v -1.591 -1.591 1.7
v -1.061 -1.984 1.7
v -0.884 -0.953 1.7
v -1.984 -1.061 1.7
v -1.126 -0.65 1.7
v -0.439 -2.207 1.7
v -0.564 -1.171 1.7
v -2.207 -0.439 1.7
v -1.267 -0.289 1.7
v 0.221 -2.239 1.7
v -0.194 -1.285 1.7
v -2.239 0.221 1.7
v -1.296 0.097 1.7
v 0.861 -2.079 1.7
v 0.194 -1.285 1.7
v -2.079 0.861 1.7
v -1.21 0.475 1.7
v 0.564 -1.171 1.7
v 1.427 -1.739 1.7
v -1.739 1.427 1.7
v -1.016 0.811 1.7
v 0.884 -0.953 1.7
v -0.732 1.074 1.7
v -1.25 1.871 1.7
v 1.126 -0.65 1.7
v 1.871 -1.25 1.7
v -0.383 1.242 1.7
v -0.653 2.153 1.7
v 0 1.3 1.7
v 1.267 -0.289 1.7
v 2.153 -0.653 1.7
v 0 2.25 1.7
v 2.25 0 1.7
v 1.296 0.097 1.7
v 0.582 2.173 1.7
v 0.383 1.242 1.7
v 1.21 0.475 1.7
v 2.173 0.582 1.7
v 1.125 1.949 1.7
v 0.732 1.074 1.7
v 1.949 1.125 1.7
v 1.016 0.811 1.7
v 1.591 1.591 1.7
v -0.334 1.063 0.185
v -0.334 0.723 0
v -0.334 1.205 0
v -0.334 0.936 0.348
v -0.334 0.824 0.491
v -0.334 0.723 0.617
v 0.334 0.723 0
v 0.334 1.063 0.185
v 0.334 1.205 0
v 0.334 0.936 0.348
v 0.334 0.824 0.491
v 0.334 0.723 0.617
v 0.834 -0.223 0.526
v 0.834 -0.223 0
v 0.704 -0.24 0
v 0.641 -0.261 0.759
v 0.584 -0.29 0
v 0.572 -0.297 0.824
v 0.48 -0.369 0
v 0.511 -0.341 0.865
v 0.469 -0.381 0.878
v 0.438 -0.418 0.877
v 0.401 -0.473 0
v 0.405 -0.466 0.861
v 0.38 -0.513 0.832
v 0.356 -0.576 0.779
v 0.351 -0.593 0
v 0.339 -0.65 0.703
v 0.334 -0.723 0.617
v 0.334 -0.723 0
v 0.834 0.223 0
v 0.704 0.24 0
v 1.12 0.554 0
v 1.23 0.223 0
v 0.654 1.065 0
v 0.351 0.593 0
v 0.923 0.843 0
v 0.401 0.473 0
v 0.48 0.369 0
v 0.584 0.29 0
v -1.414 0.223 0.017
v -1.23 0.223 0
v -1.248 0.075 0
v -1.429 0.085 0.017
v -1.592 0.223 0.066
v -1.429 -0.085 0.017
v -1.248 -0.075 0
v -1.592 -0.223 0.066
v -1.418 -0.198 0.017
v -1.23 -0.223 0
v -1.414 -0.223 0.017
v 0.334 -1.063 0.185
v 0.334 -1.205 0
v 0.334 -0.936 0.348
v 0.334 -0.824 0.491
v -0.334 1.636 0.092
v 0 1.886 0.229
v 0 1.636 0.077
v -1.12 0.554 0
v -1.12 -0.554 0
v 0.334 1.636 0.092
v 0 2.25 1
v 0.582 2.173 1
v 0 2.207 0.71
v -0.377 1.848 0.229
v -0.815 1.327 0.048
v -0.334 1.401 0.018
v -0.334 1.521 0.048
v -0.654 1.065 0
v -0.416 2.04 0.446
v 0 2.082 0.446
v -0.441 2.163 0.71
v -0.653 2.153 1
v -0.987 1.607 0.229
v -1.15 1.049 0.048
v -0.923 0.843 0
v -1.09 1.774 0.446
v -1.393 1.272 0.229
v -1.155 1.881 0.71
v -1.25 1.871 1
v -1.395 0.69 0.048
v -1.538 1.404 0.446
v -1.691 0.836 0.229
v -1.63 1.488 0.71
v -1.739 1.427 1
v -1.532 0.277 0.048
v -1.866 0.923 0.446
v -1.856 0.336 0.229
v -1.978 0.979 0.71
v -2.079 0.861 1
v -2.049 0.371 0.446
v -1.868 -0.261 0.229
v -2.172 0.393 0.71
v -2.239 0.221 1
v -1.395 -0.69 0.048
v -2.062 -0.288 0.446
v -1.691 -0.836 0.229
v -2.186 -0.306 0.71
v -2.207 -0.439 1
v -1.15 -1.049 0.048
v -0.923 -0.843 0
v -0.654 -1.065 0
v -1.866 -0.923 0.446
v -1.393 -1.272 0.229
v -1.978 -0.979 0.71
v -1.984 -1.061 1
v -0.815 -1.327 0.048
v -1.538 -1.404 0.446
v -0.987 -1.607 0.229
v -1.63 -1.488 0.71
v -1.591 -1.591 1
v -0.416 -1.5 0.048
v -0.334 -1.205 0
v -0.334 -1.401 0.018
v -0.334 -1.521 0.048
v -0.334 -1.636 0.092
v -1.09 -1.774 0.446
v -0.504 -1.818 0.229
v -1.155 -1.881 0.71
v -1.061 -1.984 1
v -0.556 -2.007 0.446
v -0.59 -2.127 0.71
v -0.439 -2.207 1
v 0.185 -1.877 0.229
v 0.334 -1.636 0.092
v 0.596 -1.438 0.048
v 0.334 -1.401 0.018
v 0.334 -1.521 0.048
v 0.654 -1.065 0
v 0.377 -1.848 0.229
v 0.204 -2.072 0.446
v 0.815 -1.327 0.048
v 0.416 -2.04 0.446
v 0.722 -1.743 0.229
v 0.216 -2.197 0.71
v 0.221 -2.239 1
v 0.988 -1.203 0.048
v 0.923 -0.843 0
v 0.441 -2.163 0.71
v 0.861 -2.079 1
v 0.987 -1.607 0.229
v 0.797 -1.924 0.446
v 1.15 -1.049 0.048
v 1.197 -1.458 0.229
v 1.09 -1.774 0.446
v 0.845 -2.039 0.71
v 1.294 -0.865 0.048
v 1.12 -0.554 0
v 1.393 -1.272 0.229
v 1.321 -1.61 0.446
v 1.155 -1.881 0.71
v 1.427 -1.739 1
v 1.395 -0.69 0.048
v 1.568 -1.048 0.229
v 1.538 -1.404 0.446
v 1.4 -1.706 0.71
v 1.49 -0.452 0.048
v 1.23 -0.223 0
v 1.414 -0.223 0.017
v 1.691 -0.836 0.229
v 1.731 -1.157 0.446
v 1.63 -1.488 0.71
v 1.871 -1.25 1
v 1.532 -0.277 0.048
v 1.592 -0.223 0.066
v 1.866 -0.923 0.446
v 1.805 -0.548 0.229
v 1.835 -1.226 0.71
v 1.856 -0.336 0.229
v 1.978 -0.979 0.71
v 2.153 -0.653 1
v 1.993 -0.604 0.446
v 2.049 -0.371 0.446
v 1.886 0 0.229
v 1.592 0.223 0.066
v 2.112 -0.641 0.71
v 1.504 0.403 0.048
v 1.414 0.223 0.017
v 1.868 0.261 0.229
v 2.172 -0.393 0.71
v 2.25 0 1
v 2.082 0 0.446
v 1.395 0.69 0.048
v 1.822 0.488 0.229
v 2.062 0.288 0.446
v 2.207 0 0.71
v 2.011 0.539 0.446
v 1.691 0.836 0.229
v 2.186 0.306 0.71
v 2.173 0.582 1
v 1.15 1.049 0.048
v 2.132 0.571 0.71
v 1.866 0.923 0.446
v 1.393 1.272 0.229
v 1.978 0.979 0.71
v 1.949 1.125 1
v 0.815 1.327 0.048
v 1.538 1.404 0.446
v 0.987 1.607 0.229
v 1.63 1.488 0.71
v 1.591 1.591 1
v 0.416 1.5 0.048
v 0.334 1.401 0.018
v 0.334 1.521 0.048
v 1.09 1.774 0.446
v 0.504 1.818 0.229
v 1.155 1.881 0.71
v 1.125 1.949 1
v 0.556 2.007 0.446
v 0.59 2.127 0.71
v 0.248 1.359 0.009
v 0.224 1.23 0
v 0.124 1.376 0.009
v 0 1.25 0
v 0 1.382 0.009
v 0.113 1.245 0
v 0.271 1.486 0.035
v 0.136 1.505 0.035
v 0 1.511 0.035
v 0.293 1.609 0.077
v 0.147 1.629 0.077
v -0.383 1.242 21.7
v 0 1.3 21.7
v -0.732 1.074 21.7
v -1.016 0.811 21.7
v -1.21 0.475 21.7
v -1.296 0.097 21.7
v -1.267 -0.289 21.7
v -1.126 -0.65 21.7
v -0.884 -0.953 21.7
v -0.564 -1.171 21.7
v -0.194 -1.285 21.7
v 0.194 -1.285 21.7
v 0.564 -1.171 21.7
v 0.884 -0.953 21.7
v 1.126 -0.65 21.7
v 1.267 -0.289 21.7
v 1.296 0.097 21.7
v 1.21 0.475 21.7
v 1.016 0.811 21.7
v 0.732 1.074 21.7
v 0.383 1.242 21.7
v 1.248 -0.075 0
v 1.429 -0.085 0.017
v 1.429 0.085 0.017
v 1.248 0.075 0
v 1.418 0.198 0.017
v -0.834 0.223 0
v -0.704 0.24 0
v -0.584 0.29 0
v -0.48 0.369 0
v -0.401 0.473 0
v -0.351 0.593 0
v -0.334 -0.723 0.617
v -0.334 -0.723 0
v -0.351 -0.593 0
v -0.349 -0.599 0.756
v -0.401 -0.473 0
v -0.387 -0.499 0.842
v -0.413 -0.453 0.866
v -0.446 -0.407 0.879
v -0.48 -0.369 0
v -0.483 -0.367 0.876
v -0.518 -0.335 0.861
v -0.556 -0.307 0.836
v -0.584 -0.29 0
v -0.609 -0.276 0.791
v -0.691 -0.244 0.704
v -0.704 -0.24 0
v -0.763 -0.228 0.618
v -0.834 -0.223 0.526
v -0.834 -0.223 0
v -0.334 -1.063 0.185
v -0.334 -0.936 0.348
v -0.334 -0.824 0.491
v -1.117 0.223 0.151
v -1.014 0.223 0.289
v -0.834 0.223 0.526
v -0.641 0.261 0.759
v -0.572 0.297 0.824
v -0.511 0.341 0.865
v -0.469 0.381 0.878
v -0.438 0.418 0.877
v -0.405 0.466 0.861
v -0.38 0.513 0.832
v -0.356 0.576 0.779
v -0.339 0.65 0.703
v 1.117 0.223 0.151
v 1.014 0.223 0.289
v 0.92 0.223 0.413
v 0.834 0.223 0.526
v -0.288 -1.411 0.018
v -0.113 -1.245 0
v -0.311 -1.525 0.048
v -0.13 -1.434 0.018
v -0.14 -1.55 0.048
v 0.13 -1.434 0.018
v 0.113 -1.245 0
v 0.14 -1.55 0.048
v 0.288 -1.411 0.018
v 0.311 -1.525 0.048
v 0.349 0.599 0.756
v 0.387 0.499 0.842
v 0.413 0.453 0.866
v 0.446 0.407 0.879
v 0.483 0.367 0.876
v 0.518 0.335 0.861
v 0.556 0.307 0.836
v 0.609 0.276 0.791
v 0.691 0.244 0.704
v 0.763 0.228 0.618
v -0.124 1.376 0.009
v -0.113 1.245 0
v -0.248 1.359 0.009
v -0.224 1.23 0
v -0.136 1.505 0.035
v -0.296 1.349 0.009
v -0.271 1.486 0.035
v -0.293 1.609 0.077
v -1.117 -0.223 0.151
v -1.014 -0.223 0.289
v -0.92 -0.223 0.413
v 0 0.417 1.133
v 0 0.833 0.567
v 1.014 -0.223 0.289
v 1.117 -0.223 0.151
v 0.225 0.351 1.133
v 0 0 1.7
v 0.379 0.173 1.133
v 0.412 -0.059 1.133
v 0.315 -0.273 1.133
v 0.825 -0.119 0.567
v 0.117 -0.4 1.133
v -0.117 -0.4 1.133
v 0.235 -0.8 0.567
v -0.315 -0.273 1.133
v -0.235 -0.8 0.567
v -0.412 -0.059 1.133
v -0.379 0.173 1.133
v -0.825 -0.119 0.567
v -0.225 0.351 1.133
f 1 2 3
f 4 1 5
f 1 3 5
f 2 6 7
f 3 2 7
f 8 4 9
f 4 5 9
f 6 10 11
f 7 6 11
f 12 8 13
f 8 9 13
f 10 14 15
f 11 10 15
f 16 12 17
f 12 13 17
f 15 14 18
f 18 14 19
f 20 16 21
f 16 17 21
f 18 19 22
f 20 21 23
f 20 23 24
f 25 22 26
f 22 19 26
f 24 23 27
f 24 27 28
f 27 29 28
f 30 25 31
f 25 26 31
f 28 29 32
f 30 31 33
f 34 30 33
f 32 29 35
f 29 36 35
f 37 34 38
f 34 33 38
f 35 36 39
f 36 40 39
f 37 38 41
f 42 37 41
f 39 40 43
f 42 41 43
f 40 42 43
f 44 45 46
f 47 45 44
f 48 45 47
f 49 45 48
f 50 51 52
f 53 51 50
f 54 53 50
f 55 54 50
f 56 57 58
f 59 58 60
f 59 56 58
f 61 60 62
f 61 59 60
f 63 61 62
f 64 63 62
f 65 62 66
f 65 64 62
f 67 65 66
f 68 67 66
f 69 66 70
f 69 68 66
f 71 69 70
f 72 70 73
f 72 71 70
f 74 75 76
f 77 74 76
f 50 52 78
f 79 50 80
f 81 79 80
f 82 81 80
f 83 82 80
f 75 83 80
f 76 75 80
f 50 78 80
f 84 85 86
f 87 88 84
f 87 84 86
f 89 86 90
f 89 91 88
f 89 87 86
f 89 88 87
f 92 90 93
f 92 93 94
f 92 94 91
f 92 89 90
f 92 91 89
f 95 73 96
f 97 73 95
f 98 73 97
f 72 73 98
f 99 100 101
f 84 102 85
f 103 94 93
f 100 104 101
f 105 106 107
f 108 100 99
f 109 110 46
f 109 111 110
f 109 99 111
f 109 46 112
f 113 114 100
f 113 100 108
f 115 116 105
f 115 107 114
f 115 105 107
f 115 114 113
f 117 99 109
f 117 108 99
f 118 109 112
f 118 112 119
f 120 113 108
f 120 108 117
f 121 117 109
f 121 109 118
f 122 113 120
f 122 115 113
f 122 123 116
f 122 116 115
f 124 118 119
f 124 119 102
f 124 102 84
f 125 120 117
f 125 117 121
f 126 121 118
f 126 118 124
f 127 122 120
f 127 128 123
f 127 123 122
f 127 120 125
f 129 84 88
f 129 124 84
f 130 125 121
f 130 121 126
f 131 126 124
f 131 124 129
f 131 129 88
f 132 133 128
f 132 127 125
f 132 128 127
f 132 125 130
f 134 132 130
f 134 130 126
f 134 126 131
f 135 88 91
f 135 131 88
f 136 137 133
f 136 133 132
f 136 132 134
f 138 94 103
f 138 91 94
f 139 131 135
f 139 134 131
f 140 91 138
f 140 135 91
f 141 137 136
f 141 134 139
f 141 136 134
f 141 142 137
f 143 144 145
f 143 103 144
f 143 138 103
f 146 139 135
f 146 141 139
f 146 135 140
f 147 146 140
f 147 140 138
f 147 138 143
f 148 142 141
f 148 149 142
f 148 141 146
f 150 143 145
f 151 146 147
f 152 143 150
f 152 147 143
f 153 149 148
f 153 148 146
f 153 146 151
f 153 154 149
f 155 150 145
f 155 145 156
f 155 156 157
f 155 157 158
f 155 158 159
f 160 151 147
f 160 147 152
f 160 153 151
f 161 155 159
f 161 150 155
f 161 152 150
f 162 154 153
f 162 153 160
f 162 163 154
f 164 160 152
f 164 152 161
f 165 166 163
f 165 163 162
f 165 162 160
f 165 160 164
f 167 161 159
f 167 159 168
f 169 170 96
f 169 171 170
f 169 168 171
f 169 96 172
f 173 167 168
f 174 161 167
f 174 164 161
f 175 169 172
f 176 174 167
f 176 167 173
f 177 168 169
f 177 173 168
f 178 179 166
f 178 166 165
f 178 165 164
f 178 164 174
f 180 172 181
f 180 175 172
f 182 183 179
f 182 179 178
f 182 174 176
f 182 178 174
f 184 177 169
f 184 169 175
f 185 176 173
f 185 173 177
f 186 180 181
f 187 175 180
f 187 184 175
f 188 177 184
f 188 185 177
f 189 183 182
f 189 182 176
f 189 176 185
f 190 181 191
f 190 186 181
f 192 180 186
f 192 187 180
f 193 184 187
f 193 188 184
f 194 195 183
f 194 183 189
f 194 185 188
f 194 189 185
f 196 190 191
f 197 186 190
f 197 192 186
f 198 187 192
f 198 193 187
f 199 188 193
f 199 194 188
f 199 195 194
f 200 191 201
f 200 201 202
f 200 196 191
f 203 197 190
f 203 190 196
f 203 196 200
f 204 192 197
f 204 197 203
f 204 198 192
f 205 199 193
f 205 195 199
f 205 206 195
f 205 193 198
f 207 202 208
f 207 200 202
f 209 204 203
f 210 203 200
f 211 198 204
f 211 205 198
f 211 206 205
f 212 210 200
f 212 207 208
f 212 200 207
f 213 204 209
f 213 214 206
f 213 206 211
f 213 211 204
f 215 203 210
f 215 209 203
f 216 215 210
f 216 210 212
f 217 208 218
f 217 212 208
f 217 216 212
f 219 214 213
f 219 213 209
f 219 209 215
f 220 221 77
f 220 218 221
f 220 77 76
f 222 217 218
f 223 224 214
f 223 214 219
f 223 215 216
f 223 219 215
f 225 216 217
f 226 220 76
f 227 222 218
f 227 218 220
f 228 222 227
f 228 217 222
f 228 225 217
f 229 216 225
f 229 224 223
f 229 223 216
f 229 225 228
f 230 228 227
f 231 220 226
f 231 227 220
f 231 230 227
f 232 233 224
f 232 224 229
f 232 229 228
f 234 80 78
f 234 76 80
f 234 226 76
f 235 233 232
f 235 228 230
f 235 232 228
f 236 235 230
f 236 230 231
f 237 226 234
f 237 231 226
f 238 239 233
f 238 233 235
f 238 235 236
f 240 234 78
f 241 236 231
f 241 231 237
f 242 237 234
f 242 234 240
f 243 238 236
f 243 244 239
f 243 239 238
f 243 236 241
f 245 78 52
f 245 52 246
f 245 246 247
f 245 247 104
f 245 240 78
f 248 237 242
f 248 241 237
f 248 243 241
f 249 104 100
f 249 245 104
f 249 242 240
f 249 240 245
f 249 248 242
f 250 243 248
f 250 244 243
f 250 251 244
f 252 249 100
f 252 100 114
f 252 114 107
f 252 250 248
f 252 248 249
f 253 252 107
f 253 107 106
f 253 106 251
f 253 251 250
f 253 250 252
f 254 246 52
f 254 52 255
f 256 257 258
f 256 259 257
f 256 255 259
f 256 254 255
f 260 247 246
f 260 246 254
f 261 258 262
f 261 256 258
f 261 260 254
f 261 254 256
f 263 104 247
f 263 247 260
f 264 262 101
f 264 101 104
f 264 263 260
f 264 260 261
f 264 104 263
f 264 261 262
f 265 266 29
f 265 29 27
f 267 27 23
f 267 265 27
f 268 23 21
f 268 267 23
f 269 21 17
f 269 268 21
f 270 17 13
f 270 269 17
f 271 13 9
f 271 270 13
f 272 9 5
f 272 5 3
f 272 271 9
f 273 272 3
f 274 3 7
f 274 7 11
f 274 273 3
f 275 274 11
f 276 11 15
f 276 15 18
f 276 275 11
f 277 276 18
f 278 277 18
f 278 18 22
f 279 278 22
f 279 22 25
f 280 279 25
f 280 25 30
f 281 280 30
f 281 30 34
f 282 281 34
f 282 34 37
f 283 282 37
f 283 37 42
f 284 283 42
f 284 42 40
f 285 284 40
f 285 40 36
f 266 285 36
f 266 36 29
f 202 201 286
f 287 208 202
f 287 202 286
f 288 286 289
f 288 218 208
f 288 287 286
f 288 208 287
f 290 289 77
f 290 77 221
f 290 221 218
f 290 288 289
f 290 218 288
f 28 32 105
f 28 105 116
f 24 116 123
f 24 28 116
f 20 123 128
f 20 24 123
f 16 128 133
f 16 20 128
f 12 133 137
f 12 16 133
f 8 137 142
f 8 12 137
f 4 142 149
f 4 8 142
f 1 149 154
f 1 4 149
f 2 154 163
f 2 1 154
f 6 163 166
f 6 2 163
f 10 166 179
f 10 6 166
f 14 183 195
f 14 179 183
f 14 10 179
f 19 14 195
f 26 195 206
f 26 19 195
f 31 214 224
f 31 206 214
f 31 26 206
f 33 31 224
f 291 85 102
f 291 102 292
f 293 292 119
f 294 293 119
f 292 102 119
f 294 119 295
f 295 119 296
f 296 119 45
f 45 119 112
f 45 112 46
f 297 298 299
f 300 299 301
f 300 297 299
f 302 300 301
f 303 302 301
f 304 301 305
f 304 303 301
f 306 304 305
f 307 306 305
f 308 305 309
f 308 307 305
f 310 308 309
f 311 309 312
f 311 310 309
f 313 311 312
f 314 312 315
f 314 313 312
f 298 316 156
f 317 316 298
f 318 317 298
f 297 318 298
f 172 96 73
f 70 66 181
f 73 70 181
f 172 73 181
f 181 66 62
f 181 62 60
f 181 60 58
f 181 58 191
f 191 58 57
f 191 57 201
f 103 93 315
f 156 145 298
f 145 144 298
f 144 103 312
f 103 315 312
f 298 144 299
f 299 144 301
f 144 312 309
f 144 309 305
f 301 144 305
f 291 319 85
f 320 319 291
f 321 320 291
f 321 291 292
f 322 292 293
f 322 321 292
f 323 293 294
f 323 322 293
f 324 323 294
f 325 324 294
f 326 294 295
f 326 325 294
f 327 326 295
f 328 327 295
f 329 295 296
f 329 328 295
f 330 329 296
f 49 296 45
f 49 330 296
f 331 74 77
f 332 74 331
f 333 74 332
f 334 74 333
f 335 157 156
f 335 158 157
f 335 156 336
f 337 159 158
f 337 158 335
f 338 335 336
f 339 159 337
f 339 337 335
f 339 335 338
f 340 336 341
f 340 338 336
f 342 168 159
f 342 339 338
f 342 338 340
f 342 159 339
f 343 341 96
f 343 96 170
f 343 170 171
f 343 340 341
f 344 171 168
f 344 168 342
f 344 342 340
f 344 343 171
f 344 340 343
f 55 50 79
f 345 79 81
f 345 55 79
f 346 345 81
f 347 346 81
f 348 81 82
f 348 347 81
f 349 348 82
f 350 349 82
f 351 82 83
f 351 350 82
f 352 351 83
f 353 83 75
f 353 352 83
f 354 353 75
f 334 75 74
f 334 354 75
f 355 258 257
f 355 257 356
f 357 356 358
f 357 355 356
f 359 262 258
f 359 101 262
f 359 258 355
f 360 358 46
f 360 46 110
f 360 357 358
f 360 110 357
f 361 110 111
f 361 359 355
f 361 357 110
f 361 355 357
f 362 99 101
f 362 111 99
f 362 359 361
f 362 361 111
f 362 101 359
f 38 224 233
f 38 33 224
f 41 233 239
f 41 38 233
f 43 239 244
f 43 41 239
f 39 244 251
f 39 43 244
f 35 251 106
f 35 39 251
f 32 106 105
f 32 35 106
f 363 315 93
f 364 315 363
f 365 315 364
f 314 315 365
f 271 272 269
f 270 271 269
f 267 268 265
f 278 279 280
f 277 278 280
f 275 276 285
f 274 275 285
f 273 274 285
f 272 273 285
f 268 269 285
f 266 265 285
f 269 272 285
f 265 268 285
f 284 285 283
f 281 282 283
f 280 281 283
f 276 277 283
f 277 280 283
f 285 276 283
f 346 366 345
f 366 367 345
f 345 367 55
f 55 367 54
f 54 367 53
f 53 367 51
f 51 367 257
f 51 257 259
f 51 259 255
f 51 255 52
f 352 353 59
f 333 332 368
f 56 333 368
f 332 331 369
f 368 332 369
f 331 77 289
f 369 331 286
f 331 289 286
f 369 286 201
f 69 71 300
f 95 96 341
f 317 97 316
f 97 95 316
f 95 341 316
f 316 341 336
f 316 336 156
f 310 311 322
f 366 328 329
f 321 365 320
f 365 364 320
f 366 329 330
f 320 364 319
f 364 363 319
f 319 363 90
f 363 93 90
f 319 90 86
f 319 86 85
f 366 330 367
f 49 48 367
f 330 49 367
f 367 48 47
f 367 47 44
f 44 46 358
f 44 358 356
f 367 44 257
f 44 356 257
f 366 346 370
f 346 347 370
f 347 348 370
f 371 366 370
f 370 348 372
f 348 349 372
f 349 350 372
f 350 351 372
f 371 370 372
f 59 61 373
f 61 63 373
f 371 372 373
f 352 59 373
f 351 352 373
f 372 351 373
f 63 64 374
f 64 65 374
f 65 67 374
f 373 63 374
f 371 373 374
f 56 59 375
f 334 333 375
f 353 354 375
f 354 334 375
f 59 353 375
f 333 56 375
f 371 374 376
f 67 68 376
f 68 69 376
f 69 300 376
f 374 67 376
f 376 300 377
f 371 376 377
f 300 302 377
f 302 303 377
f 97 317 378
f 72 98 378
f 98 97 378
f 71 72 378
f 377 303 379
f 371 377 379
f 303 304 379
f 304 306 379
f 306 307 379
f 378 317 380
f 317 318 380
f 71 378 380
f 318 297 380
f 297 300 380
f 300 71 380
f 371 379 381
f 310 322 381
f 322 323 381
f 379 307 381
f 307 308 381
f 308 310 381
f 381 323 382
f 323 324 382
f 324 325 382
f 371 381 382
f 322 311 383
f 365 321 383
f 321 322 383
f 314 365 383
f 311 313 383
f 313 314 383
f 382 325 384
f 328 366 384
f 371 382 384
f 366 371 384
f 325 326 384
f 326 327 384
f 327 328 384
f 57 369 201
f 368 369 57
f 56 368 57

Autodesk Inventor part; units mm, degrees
ref_plane "YZ Plane" through (0, 0, 0) normal (1, 0, 0) x (0, 1, 0)
ref_plane "XZ Plane" through (0, 0, 0) normal (0, 1, 0) x (-1, 0, 0)
ref_plane "XY Plane" through (0, 0, 0) normal (0, 0, 1) x (1, 0, 0)
sketch "スケッチ1" plane through (0, 0, 0) normal (1, 0, 0) x (0, 1, 0)
  line L0 (0, 21.7) -> (0, 0)
  line L1 (0, 0) -> (1.25, 0)
  line L2 (2.25, 1) -> (2.25, 1.7)
  line L3 (2.25, 1.7) -> (1.3, 1.7)
  line L4 (1.3, 1.7) -> (1.3, 21.7)
  line L5 (1.3, 21.7) -> (0, 21.7)
  line L6 (1.25, 0) -> (0, 1.7)
  arc A0 (1.25, 0) -> (2.25, 1) centre (1.25, 1) ccw
  line L7 (1.25, 0) -> (2.25, 0)
  line L8 (2.25, 0) -> (2.25, 1)
  dimension "d2" = 1.7
  dimension "d10" = 20
  dimension "d11" = 2.6
  dimension "d12" = 4.5
  dimension "d14" = 1
revolve "回転1" add sketch "スケッチ1" angle 360 about axis through (0, 0, 21.7) along (0, 0, -1) contours L5 L4 L3 L2 A0 L6 L0
thread "ねじ1" size "M2.6x0.45" class "6g" standard "ANSI Metric M Profile" full length
sketch "スケッチ2" plane through (0, 0, 1.7) normal (0, 0, 1) x (1, 0, 0)
  line L0 (0.3339, -1.6357) -> (-0.3339, -1.6357)
  line L1 (-0.3339, -1.6357) -> (-0.3339, -0.7226)
  line L2 (-0.3339, 1.6357) -> (0.3339, 1.6357)
  line L3 (0.3339, 1.6357) -> (0.3339, 0.7226)
  line L4 (0.3339, -1.6357) -> (-0.3339, 1.6357) construction
  line L5 (-0.3339, -1.6357) -> (0.3339, 1.6357) construction
  line L6 (-1.5922, 0.2226) -> (-0.8339, 0.2226)
  line L7 (1.5922, 0.2226) -> (1.5922, -0.2226)
  line L8 (1.5922, -0.2226) -> (0.8339, -0.2226)
  line L9 (-1.5922, -0.2226) -> (-1.5922, 0.2226)
  line L10 (-1.5922, 0.2226) -> (1.5922, -0.2226) construction
  line L11 (1.5922, 0.2226) -> (-1.5922, -0.2226) construction
  circle A0 centre (0, 0) radius 2.25
  line L12 (0.3339, -0.7226) -> (0.3339, -1.6357)
  line L13 (0.8339, 0.2226) -> (1.5922, 0.2226)
  line L14 (-0.8339, -0.2226) -> (-1.5922, -0.2226)
  line L15 (-0.3339, 0.7226) -> (-0.3339, 1.6357)
  arc A1 (0.8339, -0.2226) -> (0.3339, -0.7226) centre (0.8339, -0.7226) ccw
  arc A2 (0.3339, 0.7226) -> (0.8339, 0.2226) centre (0.8339, 0.7226) ccw
  arc A3 (-0.8339, 0.2226) -> (-0.3339, 0.7226) centre (-0.8339, 0.7226) ccw
  arc A4 (-0.3339, -0.7226) -> (-0.8339, -0.2226) centre (-0.8339, -0.7226) ccw
  point P0 (0, 0)
  point P1 (-0.3339, -0.2226)
  point P2 (-0.3339, 0.2226)
  point P3 (0.3339, 0.2226)
  point P4 (0.3339, -0.2226)
  dimension "d18" = 0.5
extrude "押し出し2" add sketch "スケッチ2" against normal blind 1.7
revolve "回転2" cut sketch "スケッチ1" angle 360 about axis through (0, 0, 21.7) along (0, 0, -1) contours A0 L8 L7
properties part number "F-2620EB" material "チタン"
